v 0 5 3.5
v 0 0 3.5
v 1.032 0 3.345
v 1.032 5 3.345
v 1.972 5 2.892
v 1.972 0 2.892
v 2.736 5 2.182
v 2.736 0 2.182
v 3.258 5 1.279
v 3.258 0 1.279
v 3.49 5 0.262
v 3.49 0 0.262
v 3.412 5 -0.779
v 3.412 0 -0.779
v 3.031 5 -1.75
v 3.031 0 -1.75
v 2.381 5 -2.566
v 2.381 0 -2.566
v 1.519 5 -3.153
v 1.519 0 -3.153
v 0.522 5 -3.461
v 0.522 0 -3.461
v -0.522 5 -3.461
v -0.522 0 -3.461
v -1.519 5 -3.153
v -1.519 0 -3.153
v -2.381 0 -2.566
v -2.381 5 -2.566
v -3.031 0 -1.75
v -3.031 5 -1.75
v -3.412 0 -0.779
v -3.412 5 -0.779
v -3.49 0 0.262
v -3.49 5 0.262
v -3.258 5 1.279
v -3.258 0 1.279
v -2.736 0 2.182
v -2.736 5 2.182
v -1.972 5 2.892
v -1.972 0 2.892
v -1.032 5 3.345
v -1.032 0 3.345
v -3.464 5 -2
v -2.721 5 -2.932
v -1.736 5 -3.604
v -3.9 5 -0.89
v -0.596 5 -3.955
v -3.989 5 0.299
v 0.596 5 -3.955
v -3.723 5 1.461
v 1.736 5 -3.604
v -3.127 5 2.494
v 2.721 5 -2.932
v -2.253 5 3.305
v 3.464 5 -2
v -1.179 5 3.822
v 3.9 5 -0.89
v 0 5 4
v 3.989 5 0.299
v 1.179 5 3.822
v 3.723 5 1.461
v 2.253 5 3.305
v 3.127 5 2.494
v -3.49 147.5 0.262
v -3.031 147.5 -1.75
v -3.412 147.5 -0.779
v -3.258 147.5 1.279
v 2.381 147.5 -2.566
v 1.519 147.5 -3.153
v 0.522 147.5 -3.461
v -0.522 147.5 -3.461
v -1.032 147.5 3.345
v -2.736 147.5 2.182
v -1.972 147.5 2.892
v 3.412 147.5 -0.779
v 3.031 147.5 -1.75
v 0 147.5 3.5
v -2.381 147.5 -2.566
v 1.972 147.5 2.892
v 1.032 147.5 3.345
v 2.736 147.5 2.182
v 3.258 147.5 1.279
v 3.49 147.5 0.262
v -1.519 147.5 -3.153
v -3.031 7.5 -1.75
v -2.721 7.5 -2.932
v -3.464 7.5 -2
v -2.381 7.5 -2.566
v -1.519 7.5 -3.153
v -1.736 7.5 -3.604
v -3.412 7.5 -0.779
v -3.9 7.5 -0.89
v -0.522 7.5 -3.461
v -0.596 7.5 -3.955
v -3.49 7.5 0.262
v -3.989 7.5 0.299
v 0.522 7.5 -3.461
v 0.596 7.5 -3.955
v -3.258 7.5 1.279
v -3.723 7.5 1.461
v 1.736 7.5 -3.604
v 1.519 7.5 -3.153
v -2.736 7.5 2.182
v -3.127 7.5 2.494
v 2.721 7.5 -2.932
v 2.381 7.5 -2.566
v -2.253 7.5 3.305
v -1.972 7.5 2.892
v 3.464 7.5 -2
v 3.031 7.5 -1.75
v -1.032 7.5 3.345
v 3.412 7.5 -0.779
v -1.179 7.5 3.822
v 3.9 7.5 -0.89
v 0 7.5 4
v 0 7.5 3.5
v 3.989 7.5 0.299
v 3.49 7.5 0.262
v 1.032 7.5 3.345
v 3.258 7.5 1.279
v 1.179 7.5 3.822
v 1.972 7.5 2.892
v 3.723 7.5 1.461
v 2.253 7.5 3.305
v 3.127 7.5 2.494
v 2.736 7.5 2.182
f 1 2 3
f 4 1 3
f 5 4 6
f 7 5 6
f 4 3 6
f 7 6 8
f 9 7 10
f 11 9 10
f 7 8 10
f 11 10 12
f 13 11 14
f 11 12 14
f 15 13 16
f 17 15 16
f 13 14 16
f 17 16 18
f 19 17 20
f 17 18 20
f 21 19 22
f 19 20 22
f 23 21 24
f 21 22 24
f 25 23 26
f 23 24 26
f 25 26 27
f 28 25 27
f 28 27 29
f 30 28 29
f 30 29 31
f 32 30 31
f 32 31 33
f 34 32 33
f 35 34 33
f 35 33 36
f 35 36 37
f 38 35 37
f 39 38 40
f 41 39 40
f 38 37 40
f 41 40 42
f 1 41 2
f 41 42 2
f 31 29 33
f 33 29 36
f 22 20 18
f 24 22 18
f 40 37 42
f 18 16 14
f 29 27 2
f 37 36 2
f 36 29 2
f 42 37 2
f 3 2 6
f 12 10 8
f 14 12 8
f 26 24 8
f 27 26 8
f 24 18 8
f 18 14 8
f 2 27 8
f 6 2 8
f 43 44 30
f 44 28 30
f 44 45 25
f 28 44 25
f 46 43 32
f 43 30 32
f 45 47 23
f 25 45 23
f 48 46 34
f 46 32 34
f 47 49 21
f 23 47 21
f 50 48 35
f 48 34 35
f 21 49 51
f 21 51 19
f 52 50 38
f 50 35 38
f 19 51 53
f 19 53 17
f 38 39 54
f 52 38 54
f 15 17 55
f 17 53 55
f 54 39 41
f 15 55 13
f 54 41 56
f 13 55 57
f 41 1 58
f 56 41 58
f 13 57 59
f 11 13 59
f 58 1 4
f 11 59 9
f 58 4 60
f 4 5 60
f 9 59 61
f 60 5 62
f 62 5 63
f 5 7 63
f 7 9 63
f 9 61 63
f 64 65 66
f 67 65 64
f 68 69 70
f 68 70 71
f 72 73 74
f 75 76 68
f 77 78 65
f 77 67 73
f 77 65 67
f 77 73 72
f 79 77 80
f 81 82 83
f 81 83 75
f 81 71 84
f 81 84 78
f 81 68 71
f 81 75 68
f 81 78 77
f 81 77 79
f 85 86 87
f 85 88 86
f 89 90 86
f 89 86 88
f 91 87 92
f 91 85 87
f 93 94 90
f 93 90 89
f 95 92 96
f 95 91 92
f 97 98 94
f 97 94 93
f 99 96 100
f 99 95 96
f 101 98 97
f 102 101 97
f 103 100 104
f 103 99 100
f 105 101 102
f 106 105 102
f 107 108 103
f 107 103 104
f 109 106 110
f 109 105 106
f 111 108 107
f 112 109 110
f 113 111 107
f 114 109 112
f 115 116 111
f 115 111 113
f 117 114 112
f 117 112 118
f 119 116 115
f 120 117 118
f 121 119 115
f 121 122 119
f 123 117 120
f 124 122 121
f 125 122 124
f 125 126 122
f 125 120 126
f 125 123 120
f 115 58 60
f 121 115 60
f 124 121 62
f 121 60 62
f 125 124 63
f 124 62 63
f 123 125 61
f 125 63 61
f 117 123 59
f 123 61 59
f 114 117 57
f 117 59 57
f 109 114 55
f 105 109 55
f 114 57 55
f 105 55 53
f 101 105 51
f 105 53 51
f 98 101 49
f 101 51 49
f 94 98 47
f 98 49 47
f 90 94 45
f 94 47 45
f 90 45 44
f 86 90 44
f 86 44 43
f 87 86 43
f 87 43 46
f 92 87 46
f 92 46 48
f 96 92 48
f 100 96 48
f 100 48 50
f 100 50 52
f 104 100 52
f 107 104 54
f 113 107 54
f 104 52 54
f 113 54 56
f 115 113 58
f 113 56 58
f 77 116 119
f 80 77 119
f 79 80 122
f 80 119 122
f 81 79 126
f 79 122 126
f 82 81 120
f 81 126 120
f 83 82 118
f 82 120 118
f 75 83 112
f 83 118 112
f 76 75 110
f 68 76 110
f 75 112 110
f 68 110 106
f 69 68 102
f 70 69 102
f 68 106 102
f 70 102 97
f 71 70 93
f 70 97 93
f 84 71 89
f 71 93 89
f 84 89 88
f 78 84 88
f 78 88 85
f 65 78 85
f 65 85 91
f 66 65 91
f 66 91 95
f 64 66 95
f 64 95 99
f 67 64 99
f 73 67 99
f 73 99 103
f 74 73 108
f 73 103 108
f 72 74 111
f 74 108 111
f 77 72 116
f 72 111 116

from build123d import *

# Parameters (mm, degrees)
SKETCH1_R           = 3.5
BOSS_EXTRUDE1_DEPTH = 5
SKETCH2_R           = 4
BOSS_EXTRUDE2_DEPTH = 2.5
SKETCH3_R           = 3.5
BOSS_EXTRUDE3_DEPTH = 140


with BuildPart() as part:
    # Sketch1 → Boss-Extrude1 (new body)
    with BuildSketch(Plane(origin=(0, 0, 0), x_dir=(1, 0, 0), z_dir=(0, 1, 0))):
        with Locations(Location((0, 0, 0), (0, 0, 270))):  # turned: the seam where the file's is
            Circle(SKETCH1_R)
    extrude(amount=BOSS_EXTRUDE1_DEPTH)

    # Sketch2 → Boss-Extrude2 (add)
    with BuildSketch(Plane(origin=(0, 5, 0), x_dir=(1, 0, 0), z_dir=(0, 1, 0))):
        with Locations(Location((0, 0, 0), (0, 0, 270))):  # turned: the seam where the file's is
            Circle(SKETCH2_R)
    extrude(amount=BOSS_EXTRUDE2_DEPTH)

    # Sketch3 → Boss-Extrude3 (add)
    with BuildSketch(Plane(origin=(0, 7.5, 0), x_dir=(1, 0, 0), z_dir=(0, 1, 0))):
        with Locations(Location((0, 0, 0), (0, 0, 270))):  # turned: the seam where the file's is
            Circle(SKETCH3_R)
    extrude(amount=BOSS_EXTRUDE3_DEPTH)


solid = part.part
